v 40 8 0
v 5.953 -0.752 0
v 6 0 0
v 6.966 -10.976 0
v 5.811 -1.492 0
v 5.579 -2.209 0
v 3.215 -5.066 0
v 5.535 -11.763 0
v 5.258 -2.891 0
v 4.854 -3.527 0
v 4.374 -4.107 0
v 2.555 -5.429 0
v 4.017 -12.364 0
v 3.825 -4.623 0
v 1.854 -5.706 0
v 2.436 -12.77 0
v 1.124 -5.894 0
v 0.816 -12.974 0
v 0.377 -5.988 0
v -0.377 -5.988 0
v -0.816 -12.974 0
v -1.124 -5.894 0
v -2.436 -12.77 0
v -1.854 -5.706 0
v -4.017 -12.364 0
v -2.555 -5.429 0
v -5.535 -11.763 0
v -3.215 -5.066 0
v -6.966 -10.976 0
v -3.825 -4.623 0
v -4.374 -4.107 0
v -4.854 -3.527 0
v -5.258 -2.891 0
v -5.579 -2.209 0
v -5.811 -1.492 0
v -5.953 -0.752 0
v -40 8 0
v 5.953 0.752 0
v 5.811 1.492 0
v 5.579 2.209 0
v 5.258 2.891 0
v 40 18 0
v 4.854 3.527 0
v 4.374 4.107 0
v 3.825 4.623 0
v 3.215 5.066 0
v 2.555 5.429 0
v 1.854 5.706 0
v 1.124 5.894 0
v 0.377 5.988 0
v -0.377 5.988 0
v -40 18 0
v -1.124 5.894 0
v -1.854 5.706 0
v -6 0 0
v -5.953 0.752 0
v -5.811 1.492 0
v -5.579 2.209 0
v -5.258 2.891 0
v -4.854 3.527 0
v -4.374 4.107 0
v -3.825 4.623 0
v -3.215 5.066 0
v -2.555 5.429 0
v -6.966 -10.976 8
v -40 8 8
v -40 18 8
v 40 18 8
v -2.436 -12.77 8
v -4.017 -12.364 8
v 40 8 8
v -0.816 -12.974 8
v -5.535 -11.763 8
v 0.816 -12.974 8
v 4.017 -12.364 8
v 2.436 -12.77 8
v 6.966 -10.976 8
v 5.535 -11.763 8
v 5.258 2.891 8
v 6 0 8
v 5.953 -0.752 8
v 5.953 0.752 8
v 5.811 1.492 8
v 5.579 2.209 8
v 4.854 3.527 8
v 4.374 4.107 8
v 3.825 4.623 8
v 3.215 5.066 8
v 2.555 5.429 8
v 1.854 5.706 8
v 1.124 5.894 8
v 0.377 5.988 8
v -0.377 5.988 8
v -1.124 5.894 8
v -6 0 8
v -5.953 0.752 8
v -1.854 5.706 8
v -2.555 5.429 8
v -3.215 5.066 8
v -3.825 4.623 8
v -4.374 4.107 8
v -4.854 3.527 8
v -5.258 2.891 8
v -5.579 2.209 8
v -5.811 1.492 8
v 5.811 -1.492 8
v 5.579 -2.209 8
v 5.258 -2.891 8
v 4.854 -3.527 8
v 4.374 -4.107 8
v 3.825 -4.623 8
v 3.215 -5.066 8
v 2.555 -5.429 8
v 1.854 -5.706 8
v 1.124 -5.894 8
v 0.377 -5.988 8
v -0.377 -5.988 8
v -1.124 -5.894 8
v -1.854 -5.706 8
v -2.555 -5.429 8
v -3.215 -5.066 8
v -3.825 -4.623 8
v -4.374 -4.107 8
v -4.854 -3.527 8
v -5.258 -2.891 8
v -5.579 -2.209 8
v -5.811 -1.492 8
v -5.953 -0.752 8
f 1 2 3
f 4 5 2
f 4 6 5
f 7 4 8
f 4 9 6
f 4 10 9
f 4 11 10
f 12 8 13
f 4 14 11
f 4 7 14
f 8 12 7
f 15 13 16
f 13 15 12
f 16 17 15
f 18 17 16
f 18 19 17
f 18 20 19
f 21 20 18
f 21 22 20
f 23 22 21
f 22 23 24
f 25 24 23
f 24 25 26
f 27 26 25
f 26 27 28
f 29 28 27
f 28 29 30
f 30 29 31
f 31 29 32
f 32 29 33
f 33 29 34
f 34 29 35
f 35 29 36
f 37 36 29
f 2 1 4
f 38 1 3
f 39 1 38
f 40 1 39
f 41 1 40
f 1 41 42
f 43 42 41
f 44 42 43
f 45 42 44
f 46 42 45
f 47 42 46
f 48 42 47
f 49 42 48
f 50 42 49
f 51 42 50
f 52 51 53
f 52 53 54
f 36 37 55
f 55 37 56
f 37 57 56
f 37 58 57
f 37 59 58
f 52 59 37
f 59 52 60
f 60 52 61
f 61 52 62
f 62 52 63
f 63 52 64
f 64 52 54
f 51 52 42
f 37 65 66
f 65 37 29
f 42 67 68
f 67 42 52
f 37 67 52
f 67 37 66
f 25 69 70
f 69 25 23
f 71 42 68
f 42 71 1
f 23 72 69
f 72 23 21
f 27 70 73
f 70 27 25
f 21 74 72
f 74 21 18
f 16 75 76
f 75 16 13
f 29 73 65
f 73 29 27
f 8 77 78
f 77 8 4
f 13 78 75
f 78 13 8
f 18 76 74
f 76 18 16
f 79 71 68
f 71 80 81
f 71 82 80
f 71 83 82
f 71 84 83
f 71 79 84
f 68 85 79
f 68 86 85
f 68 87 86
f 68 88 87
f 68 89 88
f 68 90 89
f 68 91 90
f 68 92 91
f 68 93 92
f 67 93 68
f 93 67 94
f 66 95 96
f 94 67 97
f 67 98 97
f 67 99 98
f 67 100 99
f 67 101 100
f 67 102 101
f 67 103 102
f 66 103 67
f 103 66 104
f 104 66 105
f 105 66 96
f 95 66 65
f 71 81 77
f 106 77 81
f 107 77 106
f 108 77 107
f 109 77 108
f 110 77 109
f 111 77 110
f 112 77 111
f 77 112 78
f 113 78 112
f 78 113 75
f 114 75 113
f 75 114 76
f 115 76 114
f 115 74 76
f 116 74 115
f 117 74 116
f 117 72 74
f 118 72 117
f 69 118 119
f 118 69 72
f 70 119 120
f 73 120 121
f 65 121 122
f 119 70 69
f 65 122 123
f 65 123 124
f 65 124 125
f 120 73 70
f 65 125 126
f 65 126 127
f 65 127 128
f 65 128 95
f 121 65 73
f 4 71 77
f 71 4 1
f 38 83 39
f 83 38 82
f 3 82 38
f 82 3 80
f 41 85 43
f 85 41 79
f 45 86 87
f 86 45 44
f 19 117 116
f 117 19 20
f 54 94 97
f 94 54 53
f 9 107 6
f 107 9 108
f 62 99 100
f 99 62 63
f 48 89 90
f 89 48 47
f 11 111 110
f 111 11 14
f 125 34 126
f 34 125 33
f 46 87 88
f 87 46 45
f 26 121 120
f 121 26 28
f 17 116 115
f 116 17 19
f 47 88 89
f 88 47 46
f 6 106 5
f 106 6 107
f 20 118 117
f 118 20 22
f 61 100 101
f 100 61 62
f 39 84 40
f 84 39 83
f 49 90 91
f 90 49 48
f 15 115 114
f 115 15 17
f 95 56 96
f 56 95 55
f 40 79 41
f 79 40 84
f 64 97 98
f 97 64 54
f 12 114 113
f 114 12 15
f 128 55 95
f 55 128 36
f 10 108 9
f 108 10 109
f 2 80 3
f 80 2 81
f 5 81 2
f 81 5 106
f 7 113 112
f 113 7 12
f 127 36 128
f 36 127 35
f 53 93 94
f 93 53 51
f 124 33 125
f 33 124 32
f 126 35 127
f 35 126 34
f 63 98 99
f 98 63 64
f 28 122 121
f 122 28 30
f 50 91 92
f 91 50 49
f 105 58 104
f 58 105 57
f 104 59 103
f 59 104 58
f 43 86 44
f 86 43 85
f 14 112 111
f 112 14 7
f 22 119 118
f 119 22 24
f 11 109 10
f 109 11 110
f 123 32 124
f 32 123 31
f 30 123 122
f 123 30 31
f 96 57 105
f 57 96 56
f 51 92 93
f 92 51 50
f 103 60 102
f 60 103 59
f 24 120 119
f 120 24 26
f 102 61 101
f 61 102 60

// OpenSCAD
$fn = 50; 

difference() {
    hull() {
        cylinder( d=26, h=8 ); 
        translate([-40,8,0]) cube([40*2,10,8]); 
    }
    cylinder( d=12, h=100, center=true ); 
}
